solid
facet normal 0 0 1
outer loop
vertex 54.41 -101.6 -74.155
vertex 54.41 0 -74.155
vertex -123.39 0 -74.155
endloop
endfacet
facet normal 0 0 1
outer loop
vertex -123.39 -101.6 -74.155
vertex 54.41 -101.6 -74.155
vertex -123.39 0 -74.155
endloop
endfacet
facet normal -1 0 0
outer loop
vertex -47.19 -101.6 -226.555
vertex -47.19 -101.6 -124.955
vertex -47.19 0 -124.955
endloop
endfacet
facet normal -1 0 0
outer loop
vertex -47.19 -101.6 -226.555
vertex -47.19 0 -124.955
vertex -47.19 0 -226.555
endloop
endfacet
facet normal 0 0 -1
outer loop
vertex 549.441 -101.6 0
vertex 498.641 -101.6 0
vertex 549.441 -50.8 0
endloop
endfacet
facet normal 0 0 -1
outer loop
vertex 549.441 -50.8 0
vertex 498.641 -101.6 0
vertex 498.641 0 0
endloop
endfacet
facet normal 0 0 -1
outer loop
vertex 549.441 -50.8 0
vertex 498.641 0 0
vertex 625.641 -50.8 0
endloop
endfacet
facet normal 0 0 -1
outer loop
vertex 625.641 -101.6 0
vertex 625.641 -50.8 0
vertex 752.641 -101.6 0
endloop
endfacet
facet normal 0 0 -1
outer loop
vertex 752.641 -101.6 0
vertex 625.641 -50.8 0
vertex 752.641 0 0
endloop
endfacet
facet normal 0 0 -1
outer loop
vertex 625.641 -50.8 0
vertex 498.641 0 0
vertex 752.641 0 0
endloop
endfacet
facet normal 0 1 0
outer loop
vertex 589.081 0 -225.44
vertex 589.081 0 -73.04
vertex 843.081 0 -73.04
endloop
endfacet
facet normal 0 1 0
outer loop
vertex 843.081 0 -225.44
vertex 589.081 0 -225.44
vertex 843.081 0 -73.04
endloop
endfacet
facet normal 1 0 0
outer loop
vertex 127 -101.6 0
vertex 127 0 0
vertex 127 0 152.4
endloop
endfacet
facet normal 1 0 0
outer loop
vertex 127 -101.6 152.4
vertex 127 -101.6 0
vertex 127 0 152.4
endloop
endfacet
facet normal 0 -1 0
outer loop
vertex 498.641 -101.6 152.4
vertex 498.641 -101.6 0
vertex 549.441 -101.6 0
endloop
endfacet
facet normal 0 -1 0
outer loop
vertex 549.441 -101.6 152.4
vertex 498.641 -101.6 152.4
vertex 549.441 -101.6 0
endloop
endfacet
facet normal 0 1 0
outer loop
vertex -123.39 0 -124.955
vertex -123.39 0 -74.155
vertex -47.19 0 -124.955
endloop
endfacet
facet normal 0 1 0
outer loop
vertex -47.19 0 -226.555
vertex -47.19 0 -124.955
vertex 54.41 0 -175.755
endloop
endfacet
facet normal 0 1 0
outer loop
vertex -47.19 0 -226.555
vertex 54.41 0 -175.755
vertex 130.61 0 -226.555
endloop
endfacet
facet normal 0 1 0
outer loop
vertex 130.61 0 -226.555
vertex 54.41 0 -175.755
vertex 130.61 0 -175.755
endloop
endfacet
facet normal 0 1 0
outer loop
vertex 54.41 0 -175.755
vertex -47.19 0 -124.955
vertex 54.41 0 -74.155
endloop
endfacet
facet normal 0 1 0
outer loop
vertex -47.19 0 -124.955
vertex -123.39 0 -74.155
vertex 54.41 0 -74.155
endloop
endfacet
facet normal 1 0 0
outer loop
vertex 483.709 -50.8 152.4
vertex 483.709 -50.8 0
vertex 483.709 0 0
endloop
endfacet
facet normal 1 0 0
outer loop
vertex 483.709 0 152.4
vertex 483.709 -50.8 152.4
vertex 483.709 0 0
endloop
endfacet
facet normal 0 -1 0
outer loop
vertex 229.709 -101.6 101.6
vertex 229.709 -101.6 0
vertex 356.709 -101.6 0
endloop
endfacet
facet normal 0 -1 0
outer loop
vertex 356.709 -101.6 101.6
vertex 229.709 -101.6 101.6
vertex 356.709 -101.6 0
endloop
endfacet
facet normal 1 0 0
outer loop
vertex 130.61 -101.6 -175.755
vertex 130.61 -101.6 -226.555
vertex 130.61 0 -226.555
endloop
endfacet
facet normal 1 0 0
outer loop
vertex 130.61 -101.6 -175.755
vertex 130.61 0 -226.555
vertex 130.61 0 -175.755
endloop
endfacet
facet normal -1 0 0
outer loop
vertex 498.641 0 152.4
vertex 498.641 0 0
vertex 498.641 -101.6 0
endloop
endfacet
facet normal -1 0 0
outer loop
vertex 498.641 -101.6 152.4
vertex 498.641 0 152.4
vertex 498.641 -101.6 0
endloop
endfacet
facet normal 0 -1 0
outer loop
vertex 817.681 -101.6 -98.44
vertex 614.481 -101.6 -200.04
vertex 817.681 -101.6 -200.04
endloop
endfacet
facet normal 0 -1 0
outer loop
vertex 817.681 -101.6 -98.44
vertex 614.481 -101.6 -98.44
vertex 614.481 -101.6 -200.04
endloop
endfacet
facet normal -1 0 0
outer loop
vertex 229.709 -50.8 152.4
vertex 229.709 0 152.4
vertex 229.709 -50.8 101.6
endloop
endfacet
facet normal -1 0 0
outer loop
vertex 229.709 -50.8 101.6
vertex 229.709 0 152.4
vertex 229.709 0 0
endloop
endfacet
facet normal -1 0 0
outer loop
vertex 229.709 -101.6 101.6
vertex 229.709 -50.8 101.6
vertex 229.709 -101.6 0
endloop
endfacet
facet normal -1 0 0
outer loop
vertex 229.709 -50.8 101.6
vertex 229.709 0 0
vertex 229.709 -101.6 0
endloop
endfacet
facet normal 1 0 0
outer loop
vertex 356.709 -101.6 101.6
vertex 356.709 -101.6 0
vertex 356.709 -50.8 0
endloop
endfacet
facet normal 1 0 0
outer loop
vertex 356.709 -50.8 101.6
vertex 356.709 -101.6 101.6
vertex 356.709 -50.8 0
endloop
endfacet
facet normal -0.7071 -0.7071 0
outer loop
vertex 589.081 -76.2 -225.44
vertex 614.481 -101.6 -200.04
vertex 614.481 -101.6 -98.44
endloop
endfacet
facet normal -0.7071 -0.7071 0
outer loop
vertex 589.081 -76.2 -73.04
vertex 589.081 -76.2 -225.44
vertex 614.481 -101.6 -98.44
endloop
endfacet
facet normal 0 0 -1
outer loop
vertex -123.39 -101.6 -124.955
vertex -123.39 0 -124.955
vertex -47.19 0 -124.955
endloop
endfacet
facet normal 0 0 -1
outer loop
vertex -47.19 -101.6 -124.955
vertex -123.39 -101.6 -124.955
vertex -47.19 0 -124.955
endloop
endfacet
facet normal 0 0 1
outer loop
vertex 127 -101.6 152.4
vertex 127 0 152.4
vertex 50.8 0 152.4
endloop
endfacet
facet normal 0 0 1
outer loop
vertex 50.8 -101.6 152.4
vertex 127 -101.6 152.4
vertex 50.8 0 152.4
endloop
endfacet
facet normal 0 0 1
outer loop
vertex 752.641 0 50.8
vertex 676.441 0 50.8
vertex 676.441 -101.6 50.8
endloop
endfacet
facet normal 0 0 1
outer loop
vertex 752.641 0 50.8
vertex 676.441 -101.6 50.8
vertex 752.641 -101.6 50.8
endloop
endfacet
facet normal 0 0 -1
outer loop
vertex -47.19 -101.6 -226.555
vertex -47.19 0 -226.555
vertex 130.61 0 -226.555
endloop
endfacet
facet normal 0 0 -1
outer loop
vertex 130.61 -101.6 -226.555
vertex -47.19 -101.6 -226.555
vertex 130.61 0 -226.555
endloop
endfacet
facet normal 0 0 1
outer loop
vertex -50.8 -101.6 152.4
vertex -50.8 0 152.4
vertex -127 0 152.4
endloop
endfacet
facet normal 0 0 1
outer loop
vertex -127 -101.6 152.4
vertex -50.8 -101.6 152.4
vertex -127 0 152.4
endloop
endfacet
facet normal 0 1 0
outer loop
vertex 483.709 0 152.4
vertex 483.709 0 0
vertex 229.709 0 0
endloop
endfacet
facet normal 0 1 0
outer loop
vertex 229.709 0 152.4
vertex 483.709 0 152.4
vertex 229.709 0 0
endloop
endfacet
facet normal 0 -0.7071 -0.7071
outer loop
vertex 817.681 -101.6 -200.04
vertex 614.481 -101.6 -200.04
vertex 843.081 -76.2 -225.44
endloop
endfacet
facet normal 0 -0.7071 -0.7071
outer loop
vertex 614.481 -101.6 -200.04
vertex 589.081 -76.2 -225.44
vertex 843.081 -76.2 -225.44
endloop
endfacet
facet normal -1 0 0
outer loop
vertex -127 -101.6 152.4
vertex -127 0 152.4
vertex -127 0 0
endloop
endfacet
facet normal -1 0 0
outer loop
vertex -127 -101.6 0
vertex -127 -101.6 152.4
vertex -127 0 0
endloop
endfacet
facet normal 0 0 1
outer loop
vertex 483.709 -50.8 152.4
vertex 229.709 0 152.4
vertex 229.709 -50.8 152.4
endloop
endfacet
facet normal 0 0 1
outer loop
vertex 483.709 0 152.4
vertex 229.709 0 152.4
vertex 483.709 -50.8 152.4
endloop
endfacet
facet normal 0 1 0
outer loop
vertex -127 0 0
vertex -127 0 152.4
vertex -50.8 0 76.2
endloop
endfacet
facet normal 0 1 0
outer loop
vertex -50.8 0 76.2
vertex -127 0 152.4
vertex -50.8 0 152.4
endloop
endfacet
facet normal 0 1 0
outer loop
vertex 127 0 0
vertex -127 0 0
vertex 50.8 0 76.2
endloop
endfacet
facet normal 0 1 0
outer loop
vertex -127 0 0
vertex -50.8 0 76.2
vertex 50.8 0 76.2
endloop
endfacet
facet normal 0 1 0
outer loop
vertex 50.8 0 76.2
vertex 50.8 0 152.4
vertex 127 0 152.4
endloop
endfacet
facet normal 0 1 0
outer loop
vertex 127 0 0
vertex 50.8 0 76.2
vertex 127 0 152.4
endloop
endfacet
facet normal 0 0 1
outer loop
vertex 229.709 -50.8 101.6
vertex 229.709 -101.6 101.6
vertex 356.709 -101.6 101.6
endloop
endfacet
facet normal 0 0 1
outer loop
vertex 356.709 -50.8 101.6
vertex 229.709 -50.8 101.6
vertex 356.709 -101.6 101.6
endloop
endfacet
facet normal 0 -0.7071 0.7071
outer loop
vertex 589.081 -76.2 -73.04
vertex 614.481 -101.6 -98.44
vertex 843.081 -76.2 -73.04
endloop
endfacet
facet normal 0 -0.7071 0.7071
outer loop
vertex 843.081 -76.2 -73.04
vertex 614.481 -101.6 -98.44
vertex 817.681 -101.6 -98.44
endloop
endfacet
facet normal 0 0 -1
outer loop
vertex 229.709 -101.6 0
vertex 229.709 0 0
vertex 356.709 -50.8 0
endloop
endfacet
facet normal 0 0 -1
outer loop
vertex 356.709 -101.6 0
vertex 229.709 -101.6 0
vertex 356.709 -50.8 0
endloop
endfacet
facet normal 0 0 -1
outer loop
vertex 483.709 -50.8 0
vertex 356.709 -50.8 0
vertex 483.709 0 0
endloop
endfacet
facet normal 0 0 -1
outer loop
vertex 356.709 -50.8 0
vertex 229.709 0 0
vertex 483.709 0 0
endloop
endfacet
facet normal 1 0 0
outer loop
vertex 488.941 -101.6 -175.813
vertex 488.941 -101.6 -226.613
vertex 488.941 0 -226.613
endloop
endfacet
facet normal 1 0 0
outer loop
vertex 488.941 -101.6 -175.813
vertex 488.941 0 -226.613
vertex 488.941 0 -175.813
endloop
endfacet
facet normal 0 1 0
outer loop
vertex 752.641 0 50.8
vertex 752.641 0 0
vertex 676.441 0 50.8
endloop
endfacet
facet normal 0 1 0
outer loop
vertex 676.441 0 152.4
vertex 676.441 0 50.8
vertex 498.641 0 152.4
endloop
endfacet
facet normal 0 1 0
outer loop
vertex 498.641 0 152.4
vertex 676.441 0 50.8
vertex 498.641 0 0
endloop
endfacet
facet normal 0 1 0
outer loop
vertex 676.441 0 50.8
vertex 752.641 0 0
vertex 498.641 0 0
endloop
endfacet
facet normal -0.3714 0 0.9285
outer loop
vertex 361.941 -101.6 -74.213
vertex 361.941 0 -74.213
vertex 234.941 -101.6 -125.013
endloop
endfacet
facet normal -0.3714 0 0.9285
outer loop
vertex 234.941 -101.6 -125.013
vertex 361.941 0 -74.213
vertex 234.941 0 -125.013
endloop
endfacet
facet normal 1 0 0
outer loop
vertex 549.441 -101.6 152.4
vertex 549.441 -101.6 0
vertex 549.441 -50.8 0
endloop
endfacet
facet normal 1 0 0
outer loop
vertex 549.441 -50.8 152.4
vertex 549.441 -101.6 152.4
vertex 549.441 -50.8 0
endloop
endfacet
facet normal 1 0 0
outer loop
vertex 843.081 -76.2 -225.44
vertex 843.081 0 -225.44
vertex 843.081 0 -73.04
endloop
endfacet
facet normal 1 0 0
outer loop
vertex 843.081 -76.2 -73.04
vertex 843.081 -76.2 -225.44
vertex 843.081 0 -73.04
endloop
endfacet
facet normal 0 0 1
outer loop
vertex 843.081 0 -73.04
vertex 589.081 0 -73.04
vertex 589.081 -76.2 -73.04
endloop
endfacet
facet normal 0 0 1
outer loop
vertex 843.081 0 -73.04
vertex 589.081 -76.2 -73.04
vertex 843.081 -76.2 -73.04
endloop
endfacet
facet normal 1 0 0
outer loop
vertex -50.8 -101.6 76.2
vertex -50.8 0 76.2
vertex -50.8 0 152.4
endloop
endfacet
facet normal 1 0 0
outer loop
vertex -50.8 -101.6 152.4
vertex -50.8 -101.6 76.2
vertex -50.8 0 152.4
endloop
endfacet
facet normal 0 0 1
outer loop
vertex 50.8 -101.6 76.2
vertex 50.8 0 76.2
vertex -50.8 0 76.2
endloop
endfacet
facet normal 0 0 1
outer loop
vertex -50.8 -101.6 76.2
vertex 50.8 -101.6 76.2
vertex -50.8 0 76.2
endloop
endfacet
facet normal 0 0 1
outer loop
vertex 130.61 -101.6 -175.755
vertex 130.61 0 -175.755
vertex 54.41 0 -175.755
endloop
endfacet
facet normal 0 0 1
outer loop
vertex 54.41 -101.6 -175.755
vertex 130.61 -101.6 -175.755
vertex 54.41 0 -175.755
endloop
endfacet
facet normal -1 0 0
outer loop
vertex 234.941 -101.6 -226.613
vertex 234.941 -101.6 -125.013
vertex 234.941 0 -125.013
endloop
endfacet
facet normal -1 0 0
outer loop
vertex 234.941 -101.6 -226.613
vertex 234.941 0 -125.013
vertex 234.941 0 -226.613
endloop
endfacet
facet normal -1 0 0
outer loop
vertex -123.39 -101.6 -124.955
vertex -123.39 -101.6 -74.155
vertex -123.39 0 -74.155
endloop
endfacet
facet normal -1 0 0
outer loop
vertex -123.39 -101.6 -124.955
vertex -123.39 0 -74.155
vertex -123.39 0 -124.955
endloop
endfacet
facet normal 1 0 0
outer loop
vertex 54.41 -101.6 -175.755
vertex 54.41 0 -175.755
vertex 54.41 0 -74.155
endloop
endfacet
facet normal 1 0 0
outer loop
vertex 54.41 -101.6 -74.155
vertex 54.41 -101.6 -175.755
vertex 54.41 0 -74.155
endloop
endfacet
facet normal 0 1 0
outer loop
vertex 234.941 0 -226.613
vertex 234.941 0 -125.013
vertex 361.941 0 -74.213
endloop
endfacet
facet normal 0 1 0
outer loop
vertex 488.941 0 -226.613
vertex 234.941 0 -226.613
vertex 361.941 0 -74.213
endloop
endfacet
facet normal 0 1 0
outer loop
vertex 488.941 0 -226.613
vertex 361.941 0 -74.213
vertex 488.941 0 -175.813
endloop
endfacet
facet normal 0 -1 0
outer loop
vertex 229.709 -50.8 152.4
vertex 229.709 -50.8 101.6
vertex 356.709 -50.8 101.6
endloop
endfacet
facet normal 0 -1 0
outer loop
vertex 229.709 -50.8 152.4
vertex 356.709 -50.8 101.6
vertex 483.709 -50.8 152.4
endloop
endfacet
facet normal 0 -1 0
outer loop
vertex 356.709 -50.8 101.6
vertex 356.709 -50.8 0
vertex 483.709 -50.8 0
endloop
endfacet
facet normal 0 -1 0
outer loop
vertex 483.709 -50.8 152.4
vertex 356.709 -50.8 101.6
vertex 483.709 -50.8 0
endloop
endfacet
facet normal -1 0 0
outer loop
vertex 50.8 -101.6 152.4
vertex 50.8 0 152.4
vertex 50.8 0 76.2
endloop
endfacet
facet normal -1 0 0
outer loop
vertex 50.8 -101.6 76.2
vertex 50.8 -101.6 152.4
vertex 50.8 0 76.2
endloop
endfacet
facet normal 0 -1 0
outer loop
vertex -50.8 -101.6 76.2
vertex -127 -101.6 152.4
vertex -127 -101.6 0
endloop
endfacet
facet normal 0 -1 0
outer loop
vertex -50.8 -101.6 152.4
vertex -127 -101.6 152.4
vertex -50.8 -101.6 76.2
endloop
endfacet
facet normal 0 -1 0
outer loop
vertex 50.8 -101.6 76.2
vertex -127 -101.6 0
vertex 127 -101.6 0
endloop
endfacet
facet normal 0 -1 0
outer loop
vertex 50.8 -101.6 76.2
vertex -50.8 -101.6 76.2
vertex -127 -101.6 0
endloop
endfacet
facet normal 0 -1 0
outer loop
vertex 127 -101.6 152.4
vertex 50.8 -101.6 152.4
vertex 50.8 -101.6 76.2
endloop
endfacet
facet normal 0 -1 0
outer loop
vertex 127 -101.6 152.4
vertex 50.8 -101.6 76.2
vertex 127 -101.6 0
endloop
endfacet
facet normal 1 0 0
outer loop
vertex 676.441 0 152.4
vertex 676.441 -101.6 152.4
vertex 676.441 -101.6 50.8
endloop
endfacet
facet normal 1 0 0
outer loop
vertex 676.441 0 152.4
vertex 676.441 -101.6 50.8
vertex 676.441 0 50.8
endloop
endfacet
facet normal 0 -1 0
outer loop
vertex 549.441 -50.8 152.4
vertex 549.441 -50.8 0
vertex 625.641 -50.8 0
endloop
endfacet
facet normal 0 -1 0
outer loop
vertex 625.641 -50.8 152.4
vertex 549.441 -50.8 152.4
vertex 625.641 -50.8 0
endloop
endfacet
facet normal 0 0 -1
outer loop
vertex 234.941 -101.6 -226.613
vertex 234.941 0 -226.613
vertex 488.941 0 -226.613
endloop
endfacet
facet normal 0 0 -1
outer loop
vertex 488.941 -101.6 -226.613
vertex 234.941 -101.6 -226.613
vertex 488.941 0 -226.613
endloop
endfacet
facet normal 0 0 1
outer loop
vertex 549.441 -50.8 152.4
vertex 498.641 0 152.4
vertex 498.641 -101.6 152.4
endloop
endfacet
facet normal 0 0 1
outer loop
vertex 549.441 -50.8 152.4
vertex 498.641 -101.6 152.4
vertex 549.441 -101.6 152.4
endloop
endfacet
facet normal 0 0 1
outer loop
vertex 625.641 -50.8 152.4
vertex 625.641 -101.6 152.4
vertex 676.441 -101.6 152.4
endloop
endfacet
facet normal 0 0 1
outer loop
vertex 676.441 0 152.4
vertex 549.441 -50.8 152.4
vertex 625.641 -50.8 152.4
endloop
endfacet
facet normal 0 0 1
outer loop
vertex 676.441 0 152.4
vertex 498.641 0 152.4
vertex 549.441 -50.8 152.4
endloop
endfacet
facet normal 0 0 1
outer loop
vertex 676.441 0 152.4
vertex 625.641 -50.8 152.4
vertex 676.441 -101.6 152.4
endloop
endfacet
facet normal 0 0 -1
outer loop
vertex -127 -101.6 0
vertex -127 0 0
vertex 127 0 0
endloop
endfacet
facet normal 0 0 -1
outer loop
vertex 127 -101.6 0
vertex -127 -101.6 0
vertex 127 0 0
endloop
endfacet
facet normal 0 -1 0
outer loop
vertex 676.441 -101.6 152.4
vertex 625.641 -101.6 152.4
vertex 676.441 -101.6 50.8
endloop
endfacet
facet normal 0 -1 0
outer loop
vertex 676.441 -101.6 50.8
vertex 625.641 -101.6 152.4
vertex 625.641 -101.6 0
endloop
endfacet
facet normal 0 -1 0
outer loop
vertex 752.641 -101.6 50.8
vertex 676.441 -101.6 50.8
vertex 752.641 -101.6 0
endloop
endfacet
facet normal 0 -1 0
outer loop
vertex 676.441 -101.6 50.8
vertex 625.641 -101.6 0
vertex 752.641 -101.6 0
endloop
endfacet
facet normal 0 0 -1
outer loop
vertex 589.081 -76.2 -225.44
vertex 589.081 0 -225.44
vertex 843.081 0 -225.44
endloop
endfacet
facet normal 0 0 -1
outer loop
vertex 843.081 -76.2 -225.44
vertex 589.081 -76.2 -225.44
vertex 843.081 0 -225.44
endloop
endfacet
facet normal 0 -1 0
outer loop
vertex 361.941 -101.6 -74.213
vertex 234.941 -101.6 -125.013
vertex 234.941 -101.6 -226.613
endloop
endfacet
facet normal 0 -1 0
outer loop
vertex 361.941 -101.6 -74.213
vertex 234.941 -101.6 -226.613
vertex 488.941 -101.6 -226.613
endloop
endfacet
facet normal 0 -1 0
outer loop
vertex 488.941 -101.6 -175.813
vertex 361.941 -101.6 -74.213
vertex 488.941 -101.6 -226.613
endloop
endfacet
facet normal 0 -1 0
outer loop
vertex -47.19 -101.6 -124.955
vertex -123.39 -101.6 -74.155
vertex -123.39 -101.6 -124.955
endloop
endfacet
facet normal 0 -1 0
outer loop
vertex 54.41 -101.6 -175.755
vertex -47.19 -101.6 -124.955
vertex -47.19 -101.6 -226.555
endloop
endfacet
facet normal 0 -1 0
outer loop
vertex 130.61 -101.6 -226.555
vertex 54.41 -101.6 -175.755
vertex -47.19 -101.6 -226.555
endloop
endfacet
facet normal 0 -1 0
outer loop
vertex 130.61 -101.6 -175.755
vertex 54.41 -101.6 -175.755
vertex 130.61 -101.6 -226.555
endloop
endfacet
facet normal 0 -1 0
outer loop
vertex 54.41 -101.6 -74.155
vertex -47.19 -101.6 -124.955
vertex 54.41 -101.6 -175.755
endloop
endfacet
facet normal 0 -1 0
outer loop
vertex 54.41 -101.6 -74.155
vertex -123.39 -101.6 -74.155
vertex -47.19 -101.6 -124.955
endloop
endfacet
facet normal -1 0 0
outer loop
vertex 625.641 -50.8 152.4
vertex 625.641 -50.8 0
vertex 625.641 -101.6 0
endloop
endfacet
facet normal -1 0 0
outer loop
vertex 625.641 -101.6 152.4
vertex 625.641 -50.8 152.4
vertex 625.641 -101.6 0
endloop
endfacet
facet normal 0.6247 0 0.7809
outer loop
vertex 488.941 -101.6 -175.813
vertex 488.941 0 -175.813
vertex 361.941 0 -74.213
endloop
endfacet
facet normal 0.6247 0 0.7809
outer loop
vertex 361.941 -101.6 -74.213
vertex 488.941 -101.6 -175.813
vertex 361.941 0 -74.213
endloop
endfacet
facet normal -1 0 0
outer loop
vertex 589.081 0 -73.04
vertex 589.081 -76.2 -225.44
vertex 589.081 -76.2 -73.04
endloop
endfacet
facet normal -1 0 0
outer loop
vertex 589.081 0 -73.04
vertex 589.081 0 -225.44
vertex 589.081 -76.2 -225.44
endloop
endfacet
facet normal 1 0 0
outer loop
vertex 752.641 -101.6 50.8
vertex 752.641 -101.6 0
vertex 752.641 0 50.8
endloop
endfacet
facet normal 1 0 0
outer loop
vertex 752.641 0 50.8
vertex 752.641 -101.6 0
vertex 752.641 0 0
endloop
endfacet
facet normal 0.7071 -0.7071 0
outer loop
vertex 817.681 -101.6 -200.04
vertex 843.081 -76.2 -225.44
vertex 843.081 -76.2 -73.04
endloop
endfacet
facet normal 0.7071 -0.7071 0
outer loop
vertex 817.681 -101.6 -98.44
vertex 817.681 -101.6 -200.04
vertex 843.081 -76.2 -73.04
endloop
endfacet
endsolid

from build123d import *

# Parameters (mm, degrees)
F1_DEPTH  = 101.6
F3_DEPTH  = 152.4
F4_W      = 127
F4_H      = 50.8
F5_DEPTH  = 50.8
F7_DEPTH  = 152.4
F8_W      = 76.2
F8_H      = 101.6
F9_DEPTH  = 101.6
F11_DEPTH = 101.6
F13_DEPTH = 101.6
F14_W     = 254
F14_H     = 152.4
F15_DEPTH = 101.6
F16_SIZE  = 25.4
F17_SIZE  = 25.4
F18_SIZE  = 25.4


with BuildPart() as f1:
    # F0 (on Front) → F1 (new body)
    with BuildSketch(Plane.XZ):
        Polygon((-127, 0), (0, 0), (127, 0), (127, 152.4), (50.8, 152.4), (50.8, 76.2), (-50.8, 76.2), (-50.8, 152.4), (-127, 152.4), align=None)
    extrude(amount=F1_DEPTH)


with BuildPart() as f3:
    # F2 (on Top) → F3 (new body)
    with BuildSketch(Plane.XY):
        Polygon((483.709025, 0), (229.709025, 0), (229.709025, -101.6), (356.709025, -101.6), (356.709025, -50.8), (483.709025, -50.8), align=None)
    extrude(amount=F3_DEPTH)

    # F4 (on face) → F5 (cut)
    with BuildSketch(Plane.XZ.offset(101.6)):
        with Locations((293.209025, 127)):
            Rectangle(F4_W, F4_H)
    extrude(amount=-F5_DEPTH, mode=Mode.SUBTRACT)


with BuildPart() as f7:
    # F6 (on Top) → F7 (new body)
    with BuildSketch(Plane.XY):
        Polygon((498.641468, 0), (498.641468, -101.6), (549.441468, -101.6), (549.441468, -50.8), (625.641468, -50.8), (625.641468, -101.6), (752.641468, -101.6), (752.641468, 0), align=None)
    extrude(amount=F7_DEPTH)

    # F8 (on face) → F9 (cut)
    with BuildSketch(Plane.XY.offset(152.4)):
        with Locations((714.541468, -50.8)):
            Rectangle(F8_W, F8_H)
    extrude(amount=-F9_DEPTH, mode=Mode.SUBTRACT)


with BuildPart() as f11:
    # F10 (on Front) → F11 (new body)
    with BuildSketch(Plane.XZ):
        Polygon((54.409603, -74.1554), (-123.390397, -74.1554), (-123.390397, -124.9554), (-47.190397, -124.9554), (-47.190397, -226.5554), (130.609603, -226.5554), (130.609603, -175.7554), (54.409603, -175.7554), align=None)
    extrude(amount=F11_DEPTH)


with BuildPart() as f13:
    # F12 (on Front) → F13 (new body)
    with BuildSketch(Plane.XZ):
        Polygon((234.940886, -125.012732), (234.940886, -226.612732), (361.940886, -226.612732), (488.940886, -226.612732), (488.940886, -175.812732), (361.940886, -74.212732), align=None)
    extrude(amount=F13_DEPTH)


with BuildPart() as f15:
    # F14 (on Front) → F15 (new body)
    with BuildSketch(Plane.XZ):
        with Locations((716.0807, -149.239757)):
            Rectangle(F14_W, F14_H)
    extrude(amount=F15_DEPTH)

    # F16
    f16_edges = [f15.edges().sort_by_distance(p)[0] for p in [
        (716.0807, -101.6, -73.039757),
    ]]
    chamfer(f16_edges, length=F16_SIZE)

    # F17
    f17_edges = [f15.edges().sort_by_distance(p)[0] for p in [
        (843.0807, -101.6, -161.939757),
        (716.0807, -101.6, -225.439757),
    ]]
    chamfer(f17_edges, length=F17_SIZE)

    # F18
    f18_edges = [f15.edges().sort_by_distance(p)[0] for p in [
        (589.0807, -101.6, -149.239757),
    ]]
    chamfer(f18_edges, length=F18_SIZE)


solid = Compound([f1.part, f3.part, f7.part, f11.part, f13.part, f15.part])
